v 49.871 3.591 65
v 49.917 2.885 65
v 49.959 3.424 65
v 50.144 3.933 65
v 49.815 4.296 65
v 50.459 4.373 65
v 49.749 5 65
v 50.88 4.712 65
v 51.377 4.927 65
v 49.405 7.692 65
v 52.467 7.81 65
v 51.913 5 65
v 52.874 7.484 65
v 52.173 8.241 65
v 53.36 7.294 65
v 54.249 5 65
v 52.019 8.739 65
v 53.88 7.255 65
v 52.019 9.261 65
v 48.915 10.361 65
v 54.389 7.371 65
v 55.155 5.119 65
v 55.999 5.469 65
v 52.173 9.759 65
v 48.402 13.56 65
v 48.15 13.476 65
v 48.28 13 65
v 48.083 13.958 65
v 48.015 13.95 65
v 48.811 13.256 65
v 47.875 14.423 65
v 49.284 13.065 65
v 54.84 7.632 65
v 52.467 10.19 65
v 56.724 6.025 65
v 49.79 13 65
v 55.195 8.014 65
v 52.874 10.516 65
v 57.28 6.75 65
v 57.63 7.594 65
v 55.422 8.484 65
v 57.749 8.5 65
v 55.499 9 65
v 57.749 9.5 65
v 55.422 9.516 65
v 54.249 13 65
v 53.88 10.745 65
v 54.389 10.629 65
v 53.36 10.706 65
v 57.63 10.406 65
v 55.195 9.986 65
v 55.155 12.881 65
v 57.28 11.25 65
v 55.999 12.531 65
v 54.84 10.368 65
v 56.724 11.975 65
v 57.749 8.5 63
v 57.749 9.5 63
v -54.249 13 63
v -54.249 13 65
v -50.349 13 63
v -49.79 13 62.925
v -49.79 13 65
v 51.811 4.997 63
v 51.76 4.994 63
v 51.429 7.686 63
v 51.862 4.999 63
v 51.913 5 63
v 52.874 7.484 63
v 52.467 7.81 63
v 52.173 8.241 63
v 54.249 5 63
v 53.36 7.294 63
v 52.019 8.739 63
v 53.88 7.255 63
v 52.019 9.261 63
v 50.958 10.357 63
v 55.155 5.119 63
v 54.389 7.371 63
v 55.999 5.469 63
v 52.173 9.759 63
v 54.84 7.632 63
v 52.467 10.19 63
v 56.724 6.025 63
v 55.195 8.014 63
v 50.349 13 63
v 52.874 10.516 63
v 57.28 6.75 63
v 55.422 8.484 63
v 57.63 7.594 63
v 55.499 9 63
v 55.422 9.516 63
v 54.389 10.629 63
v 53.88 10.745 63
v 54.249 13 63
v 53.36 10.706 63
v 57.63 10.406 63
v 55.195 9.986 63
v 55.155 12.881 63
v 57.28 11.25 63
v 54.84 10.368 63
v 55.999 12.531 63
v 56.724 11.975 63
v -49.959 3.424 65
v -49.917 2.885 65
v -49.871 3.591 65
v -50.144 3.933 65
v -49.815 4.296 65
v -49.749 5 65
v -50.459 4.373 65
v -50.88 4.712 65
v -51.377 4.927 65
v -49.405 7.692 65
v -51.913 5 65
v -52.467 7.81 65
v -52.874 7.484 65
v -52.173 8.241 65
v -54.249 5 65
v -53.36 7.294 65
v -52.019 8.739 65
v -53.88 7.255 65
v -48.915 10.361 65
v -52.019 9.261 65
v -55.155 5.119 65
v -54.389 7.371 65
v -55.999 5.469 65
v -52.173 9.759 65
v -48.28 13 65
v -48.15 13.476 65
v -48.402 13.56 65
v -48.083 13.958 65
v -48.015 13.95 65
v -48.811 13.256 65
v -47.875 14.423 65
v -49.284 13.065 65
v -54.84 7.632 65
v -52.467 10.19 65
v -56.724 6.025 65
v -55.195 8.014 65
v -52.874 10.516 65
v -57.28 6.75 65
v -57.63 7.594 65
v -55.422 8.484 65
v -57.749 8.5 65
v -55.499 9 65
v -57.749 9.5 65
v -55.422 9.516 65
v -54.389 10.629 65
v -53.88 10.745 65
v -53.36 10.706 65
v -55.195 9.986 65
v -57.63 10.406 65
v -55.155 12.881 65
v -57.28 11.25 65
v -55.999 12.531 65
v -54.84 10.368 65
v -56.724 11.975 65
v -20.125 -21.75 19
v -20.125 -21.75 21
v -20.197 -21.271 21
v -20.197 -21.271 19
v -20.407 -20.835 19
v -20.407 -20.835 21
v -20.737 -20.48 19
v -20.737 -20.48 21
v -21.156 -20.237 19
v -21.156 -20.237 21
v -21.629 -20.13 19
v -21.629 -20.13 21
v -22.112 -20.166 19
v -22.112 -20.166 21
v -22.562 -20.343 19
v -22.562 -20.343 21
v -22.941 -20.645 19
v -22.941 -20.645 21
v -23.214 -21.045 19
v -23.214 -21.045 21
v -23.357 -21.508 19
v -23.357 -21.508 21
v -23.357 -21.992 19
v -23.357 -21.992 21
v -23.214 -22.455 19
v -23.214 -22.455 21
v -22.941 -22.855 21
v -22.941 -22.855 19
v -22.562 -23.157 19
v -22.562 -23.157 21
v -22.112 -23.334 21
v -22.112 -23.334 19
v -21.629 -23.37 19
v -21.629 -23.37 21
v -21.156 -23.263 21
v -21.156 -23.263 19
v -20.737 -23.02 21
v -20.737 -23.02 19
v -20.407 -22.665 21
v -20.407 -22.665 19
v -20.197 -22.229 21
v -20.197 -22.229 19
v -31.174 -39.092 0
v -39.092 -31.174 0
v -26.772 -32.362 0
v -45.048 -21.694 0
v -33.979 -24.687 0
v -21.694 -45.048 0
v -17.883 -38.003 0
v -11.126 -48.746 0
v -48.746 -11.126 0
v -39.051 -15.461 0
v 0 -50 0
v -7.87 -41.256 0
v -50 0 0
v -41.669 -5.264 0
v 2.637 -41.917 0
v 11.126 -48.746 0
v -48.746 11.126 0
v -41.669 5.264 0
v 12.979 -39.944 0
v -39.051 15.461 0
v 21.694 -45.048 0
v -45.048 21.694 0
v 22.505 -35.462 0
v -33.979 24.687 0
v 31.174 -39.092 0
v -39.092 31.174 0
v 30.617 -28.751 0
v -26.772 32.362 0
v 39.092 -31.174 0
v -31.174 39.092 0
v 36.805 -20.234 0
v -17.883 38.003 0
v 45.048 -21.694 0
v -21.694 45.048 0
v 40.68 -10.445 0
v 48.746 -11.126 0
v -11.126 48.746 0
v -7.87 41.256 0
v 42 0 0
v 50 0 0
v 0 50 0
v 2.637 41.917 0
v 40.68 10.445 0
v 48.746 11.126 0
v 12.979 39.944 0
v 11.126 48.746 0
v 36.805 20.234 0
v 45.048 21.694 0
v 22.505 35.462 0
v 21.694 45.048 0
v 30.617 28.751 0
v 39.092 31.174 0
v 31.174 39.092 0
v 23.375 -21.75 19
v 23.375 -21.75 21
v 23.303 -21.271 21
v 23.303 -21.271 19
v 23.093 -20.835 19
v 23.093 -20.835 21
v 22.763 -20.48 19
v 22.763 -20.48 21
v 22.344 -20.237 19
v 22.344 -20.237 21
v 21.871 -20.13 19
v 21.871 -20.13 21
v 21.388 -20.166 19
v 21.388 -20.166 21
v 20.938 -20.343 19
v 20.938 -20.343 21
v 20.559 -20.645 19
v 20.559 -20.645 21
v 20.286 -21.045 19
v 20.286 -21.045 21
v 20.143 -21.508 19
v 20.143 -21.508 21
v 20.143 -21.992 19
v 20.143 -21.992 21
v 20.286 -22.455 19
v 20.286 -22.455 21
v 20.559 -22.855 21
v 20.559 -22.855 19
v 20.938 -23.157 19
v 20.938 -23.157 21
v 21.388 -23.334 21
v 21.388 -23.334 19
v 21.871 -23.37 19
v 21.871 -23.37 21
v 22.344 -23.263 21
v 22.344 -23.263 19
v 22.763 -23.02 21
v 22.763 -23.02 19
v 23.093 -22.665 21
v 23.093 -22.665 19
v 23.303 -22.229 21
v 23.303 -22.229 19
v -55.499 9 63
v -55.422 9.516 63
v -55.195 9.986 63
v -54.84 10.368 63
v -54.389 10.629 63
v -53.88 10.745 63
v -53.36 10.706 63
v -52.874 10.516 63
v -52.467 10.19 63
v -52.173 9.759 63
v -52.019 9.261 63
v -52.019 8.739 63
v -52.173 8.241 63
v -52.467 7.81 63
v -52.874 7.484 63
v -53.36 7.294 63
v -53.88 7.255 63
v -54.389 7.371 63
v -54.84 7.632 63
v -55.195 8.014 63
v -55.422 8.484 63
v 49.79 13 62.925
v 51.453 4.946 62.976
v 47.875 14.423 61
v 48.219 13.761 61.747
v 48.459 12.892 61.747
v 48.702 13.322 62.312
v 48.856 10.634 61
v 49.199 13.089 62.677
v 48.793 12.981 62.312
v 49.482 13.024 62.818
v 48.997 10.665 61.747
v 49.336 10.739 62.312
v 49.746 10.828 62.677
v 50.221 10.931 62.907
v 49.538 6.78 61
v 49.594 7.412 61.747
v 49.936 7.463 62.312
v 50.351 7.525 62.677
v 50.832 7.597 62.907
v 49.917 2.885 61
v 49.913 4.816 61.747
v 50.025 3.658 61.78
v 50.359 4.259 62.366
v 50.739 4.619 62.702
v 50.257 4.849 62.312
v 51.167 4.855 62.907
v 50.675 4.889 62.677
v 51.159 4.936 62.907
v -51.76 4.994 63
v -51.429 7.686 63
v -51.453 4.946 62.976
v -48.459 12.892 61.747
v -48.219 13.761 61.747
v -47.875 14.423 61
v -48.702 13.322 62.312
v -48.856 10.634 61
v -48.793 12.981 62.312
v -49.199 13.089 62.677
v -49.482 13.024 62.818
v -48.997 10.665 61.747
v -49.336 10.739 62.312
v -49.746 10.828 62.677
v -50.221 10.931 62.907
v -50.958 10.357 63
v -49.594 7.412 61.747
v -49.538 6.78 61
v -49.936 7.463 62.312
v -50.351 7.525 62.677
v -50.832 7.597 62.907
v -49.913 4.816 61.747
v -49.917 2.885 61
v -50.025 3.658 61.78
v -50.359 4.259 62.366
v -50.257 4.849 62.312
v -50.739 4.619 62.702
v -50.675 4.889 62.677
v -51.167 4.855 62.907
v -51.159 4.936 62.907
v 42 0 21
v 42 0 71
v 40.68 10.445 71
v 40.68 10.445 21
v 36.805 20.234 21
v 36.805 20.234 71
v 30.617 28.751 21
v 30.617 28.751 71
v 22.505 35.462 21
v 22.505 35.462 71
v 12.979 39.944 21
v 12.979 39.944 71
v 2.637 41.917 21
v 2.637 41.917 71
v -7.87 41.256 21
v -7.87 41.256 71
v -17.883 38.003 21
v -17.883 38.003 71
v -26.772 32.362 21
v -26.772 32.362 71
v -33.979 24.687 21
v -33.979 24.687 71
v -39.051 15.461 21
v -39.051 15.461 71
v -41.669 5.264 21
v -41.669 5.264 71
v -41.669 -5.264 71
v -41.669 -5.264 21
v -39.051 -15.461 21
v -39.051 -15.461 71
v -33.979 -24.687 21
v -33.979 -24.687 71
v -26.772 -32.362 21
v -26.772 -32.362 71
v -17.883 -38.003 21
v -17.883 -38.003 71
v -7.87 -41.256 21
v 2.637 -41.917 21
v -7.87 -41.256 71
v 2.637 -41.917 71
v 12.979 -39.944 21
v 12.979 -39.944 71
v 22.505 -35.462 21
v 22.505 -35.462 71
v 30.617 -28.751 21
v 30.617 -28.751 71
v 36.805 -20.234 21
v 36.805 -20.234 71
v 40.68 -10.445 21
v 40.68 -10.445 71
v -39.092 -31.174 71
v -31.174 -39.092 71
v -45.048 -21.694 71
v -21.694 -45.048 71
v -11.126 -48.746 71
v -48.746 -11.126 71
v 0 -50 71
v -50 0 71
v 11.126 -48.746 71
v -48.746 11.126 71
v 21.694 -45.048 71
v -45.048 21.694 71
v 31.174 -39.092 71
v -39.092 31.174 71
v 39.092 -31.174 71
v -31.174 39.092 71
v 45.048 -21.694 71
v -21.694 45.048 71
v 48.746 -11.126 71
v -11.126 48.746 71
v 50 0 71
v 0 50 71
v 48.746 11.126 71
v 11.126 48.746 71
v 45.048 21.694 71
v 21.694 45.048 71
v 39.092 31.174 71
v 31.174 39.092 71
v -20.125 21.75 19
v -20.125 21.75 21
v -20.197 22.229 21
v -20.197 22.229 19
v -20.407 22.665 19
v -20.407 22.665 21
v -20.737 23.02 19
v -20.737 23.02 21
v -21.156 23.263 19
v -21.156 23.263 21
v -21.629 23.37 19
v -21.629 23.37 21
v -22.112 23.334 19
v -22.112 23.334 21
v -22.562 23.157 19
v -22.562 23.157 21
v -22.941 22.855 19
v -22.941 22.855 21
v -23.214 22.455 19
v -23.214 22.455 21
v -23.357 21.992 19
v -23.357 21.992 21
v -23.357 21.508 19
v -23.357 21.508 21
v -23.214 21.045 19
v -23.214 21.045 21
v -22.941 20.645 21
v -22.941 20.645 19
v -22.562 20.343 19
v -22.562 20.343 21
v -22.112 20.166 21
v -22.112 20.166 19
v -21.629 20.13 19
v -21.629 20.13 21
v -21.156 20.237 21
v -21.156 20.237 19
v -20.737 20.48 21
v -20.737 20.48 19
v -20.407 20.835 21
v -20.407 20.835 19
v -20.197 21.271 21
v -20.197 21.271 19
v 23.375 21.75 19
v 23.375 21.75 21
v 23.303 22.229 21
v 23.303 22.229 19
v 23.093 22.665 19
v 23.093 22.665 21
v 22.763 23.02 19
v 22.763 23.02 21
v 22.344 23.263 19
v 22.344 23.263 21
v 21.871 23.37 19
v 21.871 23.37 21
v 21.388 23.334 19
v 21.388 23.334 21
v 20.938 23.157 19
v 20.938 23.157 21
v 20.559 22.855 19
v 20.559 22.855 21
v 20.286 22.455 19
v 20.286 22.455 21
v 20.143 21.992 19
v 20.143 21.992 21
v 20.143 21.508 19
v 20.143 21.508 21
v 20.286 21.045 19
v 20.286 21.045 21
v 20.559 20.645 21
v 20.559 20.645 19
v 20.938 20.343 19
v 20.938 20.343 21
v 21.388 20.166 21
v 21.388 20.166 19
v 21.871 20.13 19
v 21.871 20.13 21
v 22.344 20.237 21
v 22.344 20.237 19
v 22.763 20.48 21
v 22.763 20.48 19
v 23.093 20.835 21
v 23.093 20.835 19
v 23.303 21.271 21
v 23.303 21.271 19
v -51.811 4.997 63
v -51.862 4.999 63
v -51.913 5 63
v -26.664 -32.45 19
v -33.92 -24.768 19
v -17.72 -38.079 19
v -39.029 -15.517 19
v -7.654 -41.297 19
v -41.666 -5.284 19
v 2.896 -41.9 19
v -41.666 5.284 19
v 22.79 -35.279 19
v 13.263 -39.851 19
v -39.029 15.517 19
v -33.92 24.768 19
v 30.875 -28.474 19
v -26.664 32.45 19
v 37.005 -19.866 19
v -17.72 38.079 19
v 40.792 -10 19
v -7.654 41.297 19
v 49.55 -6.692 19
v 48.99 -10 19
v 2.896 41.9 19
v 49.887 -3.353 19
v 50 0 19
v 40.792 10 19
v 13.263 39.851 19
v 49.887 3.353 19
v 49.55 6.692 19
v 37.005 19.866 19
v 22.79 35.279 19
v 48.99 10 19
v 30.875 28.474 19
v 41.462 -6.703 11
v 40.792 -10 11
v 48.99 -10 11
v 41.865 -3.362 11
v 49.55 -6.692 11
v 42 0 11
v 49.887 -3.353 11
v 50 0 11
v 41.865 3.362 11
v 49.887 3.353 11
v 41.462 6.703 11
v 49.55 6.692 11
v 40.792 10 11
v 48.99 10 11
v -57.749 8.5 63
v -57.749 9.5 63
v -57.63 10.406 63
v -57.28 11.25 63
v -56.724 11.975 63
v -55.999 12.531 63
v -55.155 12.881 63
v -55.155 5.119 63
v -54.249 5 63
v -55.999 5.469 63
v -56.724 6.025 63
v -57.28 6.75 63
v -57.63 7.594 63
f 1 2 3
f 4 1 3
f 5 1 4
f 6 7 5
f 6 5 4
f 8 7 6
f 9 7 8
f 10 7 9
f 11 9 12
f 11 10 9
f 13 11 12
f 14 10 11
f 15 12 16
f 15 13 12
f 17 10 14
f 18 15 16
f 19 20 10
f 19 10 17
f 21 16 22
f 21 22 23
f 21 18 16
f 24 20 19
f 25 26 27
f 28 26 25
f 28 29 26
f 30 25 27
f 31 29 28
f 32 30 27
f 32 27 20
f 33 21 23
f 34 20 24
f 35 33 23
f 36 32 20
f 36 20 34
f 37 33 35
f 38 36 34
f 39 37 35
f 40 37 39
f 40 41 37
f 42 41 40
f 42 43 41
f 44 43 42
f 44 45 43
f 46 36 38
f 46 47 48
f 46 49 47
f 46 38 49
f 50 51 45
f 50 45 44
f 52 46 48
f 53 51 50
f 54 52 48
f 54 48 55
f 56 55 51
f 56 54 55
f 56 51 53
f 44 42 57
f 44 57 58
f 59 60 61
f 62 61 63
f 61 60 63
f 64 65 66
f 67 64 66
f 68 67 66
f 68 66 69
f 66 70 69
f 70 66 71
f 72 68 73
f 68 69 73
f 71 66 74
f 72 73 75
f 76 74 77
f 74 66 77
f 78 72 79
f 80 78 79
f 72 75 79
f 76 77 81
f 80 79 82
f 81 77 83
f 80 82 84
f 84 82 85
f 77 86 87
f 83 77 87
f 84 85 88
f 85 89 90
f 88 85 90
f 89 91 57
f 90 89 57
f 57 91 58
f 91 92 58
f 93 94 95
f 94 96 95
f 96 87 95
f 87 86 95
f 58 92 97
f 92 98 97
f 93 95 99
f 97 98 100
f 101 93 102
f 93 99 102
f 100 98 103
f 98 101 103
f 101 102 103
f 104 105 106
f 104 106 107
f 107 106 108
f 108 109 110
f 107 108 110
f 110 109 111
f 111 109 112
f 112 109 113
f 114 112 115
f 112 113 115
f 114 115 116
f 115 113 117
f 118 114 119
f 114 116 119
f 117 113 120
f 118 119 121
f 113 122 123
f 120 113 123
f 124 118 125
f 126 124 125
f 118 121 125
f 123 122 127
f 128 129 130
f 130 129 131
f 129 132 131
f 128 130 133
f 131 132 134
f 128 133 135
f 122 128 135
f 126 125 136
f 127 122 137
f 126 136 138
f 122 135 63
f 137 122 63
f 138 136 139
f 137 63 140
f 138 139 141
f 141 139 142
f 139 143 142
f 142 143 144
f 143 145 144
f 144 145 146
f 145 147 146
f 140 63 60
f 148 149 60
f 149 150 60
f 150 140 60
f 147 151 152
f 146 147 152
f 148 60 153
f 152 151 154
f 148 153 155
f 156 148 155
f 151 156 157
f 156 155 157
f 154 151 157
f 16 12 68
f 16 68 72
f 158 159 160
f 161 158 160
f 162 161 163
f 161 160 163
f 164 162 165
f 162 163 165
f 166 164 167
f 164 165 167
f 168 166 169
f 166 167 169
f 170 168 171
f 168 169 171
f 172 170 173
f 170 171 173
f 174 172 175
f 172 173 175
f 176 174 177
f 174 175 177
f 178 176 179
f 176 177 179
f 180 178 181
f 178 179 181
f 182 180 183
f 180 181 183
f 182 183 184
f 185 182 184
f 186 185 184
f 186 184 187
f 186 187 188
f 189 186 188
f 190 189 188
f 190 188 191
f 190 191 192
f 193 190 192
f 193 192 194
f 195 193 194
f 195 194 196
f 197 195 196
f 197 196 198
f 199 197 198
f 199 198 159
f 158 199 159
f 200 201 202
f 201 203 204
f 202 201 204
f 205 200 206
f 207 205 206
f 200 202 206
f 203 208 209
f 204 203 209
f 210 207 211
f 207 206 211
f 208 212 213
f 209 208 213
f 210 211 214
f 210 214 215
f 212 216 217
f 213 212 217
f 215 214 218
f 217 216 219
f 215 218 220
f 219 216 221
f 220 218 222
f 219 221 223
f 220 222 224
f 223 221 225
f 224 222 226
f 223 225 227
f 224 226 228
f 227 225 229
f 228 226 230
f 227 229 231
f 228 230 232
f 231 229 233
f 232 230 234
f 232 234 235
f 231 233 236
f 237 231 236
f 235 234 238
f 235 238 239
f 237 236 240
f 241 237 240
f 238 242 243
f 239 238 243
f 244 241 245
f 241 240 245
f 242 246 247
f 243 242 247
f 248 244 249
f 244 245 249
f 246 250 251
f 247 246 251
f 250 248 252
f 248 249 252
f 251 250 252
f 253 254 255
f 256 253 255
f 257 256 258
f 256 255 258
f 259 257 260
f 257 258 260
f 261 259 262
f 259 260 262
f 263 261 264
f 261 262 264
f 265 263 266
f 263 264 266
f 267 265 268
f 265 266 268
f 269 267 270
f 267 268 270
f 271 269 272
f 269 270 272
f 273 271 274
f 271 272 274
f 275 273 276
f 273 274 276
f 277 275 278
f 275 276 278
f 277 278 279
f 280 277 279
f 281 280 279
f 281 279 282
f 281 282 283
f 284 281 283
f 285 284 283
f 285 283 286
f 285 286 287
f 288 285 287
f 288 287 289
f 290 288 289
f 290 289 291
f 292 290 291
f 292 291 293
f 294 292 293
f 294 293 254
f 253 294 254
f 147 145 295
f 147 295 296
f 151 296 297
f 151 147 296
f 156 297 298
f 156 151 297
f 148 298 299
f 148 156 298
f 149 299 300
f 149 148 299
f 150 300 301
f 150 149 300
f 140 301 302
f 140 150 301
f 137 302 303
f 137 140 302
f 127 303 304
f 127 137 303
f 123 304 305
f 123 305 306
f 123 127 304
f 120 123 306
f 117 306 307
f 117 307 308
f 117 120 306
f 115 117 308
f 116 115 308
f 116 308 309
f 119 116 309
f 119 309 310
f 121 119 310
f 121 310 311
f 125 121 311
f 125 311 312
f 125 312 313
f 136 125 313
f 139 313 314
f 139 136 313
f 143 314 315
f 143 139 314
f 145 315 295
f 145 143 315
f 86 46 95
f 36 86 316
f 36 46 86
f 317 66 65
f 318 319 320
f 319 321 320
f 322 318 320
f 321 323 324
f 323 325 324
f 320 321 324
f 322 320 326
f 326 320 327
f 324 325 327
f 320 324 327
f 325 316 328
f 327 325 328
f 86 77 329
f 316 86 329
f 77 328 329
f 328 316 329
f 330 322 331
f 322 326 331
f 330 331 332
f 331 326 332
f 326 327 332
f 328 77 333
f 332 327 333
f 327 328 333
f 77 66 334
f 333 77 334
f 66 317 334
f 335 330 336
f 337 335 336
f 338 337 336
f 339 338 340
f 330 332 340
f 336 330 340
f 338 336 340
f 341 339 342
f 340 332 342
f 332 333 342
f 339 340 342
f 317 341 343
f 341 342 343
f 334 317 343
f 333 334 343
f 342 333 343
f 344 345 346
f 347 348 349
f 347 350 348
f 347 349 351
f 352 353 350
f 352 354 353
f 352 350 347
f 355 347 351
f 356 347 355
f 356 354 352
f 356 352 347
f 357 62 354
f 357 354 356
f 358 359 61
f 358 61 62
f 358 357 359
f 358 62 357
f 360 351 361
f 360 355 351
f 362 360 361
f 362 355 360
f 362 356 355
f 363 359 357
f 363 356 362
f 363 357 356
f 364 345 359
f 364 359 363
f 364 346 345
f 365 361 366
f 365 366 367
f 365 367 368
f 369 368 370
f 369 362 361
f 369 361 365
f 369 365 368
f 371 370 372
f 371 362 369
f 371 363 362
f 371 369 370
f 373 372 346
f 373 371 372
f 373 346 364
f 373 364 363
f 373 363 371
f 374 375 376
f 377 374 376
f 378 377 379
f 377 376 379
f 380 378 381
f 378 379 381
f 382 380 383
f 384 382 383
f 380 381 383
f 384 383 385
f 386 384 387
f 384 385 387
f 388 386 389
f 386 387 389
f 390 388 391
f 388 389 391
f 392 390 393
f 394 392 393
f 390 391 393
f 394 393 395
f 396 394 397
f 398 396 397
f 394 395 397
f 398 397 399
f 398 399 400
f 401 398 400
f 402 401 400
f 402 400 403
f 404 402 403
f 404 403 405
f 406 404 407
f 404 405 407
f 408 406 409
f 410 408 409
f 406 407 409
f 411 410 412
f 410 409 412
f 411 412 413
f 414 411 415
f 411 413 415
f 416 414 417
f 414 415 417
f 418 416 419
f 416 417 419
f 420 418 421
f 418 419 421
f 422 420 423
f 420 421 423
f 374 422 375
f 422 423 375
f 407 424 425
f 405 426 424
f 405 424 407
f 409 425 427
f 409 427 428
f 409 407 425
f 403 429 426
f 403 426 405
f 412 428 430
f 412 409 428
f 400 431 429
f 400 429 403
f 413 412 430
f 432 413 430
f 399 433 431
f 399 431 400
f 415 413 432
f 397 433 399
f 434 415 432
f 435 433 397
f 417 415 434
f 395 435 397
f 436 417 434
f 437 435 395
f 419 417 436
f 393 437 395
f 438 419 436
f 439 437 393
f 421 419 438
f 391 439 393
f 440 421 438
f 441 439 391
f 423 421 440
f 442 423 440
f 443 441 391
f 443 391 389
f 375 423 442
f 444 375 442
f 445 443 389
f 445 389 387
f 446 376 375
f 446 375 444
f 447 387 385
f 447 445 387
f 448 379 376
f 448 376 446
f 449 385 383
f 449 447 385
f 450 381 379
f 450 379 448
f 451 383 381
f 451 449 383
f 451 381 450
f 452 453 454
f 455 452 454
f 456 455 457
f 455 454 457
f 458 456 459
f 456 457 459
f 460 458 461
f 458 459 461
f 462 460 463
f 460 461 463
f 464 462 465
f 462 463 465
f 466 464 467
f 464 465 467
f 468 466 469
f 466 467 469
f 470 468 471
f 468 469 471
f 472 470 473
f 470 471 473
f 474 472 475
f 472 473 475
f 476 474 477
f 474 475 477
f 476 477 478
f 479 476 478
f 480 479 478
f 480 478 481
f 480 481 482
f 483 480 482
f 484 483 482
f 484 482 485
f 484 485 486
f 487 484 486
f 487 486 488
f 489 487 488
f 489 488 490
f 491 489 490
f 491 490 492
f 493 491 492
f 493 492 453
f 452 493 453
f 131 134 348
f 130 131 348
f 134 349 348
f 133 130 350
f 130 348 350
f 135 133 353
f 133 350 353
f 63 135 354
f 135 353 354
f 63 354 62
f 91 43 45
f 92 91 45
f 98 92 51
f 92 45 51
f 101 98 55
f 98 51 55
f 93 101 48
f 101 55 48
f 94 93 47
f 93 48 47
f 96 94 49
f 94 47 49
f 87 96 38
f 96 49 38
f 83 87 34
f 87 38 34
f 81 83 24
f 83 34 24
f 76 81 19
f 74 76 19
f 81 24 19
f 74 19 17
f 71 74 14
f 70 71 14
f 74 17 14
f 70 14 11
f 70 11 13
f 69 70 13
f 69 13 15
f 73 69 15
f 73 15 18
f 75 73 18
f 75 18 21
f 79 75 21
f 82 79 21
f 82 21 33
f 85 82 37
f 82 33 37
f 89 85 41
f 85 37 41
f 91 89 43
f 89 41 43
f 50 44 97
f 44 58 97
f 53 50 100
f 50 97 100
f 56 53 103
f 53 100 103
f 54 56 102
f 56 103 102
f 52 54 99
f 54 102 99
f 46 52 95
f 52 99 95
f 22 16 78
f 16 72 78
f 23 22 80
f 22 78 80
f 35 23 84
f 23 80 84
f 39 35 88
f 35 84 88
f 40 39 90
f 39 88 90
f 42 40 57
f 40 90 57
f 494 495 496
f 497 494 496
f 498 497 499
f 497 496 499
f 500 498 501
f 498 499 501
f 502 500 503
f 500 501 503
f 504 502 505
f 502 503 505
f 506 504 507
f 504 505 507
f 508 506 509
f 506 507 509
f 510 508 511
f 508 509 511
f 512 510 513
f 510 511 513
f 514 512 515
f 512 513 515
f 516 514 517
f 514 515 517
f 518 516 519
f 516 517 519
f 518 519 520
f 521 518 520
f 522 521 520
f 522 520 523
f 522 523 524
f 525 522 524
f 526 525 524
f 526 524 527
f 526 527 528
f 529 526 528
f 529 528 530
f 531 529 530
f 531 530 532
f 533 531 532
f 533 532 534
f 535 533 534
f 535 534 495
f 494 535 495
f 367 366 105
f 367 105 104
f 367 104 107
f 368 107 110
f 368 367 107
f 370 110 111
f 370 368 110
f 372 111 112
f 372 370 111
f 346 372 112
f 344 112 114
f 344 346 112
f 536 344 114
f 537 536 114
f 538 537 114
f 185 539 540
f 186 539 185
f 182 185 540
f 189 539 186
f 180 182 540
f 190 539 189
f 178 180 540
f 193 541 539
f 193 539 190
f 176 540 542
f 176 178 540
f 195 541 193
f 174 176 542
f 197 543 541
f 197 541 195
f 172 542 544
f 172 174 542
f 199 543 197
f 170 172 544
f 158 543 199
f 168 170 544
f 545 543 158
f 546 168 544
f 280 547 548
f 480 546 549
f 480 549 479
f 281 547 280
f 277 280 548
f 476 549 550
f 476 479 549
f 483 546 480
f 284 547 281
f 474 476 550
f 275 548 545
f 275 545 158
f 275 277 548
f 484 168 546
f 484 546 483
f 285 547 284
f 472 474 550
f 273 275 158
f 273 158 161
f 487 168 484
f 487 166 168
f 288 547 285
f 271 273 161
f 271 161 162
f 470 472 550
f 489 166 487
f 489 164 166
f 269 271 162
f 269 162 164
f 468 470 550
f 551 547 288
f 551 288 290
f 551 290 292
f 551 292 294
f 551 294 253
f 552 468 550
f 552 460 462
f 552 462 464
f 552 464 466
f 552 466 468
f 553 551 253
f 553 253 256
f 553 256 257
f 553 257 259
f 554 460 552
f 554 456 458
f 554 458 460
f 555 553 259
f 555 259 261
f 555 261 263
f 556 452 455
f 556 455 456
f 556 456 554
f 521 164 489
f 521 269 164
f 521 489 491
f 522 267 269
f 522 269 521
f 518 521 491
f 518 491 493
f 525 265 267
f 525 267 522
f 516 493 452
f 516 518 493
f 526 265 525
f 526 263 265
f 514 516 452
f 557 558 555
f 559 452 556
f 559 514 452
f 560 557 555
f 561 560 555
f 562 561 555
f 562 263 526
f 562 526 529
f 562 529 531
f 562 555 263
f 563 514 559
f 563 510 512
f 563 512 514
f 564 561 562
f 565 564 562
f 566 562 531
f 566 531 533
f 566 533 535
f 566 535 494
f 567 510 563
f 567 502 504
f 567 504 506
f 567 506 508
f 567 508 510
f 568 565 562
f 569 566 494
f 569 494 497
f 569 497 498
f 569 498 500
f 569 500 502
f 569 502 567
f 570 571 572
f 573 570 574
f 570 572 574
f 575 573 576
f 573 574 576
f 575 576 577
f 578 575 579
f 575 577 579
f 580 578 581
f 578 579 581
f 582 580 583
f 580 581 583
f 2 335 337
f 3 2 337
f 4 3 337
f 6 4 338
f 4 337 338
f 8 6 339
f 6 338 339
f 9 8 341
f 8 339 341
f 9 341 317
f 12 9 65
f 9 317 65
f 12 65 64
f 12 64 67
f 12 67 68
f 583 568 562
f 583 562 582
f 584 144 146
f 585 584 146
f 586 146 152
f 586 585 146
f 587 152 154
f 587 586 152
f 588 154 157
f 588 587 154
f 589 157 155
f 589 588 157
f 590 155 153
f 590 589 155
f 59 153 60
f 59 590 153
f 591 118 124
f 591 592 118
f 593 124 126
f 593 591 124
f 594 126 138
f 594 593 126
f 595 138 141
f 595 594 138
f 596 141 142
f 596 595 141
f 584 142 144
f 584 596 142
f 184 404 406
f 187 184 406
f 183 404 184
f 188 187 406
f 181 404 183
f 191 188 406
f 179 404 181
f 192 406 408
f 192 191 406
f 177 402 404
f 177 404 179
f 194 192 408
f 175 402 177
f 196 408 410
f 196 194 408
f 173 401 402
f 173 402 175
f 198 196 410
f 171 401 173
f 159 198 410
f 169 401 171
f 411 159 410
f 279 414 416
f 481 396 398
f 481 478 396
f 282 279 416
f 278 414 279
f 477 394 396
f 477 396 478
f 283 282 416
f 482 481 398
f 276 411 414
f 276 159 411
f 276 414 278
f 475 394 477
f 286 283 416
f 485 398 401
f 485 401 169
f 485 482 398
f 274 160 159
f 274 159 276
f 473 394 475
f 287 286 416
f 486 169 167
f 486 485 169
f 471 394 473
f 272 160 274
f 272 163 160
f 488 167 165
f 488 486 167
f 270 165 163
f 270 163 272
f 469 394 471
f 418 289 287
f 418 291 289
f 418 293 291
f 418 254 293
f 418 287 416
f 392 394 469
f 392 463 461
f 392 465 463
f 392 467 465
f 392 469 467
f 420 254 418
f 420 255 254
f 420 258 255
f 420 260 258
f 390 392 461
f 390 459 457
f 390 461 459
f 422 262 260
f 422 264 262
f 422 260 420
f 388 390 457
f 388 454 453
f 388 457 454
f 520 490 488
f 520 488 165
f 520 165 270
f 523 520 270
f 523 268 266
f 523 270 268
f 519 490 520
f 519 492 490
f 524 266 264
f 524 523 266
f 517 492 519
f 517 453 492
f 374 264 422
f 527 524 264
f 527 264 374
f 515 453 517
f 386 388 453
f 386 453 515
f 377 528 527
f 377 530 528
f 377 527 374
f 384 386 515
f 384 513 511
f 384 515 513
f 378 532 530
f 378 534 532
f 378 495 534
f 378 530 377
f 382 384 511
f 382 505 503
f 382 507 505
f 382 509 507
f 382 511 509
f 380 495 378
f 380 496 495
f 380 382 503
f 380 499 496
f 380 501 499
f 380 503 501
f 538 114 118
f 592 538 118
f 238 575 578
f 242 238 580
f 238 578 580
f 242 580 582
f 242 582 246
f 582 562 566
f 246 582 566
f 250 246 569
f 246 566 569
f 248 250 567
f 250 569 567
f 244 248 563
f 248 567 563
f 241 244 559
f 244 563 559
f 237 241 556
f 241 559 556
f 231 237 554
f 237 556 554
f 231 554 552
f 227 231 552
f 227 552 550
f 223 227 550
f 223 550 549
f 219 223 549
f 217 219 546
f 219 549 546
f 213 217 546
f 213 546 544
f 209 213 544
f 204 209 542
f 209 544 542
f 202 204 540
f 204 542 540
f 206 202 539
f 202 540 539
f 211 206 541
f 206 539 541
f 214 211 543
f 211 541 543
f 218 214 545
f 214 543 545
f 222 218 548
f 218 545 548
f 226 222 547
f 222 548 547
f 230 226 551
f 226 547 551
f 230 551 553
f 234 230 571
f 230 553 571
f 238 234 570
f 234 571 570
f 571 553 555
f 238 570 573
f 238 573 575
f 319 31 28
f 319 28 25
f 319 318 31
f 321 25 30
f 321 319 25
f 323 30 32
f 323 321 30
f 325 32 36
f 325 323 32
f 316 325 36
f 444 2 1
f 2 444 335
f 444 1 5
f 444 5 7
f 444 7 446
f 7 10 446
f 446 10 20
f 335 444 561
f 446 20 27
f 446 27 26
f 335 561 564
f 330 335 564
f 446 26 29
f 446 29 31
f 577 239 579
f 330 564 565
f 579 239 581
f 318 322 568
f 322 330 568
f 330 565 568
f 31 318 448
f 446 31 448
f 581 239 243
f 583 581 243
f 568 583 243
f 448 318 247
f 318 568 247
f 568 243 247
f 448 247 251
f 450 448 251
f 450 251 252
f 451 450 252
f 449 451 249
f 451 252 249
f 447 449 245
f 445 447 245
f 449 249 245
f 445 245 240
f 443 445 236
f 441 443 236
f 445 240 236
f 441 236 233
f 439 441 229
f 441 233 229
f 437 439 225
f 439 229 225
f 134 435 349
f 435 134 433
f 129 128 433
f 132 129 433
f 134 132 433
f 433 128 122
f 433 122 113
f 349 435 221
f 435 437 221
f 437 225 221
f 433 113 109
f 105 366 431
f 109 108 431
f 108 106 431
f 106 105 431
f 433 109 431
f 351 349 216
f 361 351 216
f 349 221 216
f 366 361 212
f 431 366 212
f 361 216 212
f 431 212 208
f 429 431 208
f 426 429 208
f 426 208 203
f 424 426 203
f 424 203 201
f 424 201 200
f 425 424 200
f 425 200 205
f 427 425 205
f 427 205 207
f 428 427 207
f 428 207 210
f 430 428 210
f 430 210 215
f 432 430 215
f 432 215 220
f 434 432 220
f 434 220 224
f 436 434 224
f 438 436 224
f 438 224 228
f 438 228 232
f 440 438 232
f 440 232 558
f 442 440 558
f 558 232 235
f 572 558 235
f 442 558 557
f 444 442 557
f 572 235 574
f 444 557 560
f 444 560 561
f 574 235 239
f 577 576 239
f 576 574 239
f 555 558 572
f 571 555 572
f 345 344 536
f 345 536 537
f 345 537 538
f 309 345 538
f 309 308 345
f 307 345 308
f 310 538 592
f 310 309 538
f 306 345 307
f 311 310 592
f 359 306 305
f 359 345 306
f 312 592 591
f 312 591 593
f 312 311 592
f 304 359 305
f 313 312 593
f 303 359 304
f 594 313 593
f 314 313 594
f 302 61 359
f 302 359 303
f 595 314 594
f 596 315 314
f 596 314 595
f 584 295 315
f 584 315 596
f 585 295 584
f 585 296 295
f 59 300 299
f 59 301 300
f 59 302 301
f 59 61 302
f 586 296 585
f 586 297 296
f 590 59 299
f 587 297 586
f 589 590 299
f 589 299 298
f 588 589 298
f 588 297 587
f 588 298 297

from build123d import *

# Parameters (mm, degrees)
ESQUISSE1_R                  = 50
BOSS_EXTRU_1_DEPTH           = 71
COQUE1_T                     = -8
ESQUISSE2_R                  = 42
ESQUISSE2_R_2                = 1.625
ENL_V_MAT_EXTRU_4_DEPTH      = 71
ESQUISSE2_5_R                = 42
ESQUISSE2_5_R_2              = 1.625
BOSS_EXTRU_4_DEPTH           = 52
ESQUISSE2_6_R                = 42
ESQUISSE2_6_R_2              = 1.625
ENL_V_MAT_EXTRU_5_DEPTH      = 50
ENL_V_MAT_EXTRU_6_REACH      = 102.205
ESQUISSE2_7_R                = 1.625
ENL_V_MAT_EXTRU_7_REACH      = 134.442
ENL_V_MAT_EXTRU_7_END_RADIUS = 42
ESQUISSE9_W                  = 8
ESQUISSE9_H                  = 20
ESQUISSE14_R                 = 1.75
BOSS_EXTRU_6_DEPTH           = 2
CONG_1_R                     = 2
CONG_2_R                     = 3.5


with BuildPart() as part:
    # Esquisse1 → Boss.-Extru.1 (new body)
    with BuildSketch(Plane.XY):
        Circle(ESQUISSE1_R)
    extrude(amount=BOSS_EXTRU_1_DEPTH)

    # Coque1
    coque1_openings = [part.faces().sort_by_distance(p)[0] for p in [
        (0, 0, 71),
    ]]
    offset(amount=COQUE1_T, openings=coque1_openings, kind=Kind.INTERSECTION)

    # Esquisse2 → Enl_v. mat.-Extru.4 (cut)
    with BuildSketch(Plane.XY.offset(71)):
        Circle(ESQUISSE2_R)
        with Locations((-21.75, -21.75)):
            Circle(ESQUISSE2_R_2, mode=Mode.SUBTRACT)
        with Locations((21.75, -21.75)):
            Circle(ESQUISSE2_R_2, mode=Mode.SUBTRACT)
        with Locations((21.75, 21.75)):
            Circle(ESQUISSE2_R_2, mode=Mode.SUBTRACT)
        with Locations((-21.75, 21.75)):
            Circle(ESQUISSE2_R_2, mode=Mode.SUBTRACT)
        with Locations((-21.75, 21.75)):
            Circle(ESQUISSE2_R_2)
        with Locations((-21.75, -21.75)):
            Circle(ESQUISSE2_R_2)
        with Locations((21.75, -21.75)):
            Circle(ESQUISSE2_R_2)
        with Locations((21.75, 21.75)):
            Circle(ESQUISSE2_R_2)
    extrude(amount=-ENL_V_MAT_EXTRU_4_DEPTH, mode=Mode.SUBTRACT)

    # Esquisse2_5 → Boss.-Extru.4 (add)
    with BuildSketch(Plane.XY.offset(71)):
        Circle(ESQUISSE2_5_R)
        with Locations((-21.75, -21.75)):
            Circle(ESQUISSE2_5_R_2, mode=Mode.SUBTRACT)
        with Locations((21.75, -21.75)):
            Circle(ESQUISSE2_5_R_2, mode=Mode.SUBTRACT)
        with Locations((21.75, 21.75)):
            Circle(ESQUISSE2_5_R_2, mode=Mode.SUBTRACT)
        with Locations((-21.75, 21.75)):
            Circle(ESQUISSE2_5_R_2, mode=Mode.SUBTRACT)
        with Locations((-21.75, 21.75)):
            Circle(ESQUISSE2_5_R_2)
        with Locations((21.75, 21.75)):
            Circle(ESQUISSE2_5_R_2)
        with Locations((21.75, -21.75)):
            Circle(ESQUISSE2_5_R_2)
        with Locations((-21.75, -21.75)):
            Circle(ESQUISSE2_5_R_2)
    extrude(amount=-BOSS_EXTRU_4_DEPTH)

    # Esquisse2_6 → Enl_v. mat.-Extru.5 (cut)
    with BuildSketch(Plane.XY.offset(71)):
        Circle(ESQUISSE2_6_R)
        with Locations((-21.75, 21.75)):
            Circle(ESQUISSE2_6_R_2, mode=Mode.SUBTRACT)
        with Locations((21.75, 21.75)):
            Circle(ESQUISSE2_6_R_2, mode=Mode.SUBTRACT)
        with Locations((21.75, -21.75)):
            Circle(ESQUISSE2_6_R_2, mode=Mode.SUBTRACT)
        with Locations((-21.75, -21.75)):
            Circle(ESQUISSE2_6_R_2, mode=Mode.SUBTRACT)
    extrude(amount=-ENL_V_MAT_EXTRU_5_DEPTH, mode=Mode.SUBTRACT)

    # Esquisse2_7 → Enl_v. mat.-Extru.6 (cut, up to next)
    with BuildSketch(Plane.XY.offset(71), mode=Mode.PRIVATE) as enl_v_mat_extru_6_sk1:
        with Locations((-21.75, 21.75)):
            Circle(ESQUISSE2_7_R)
    enl_v_mat_extru_6_tool1 = extrude(enl_v_mat_extru_6_sk1.sketch, amount=-ENL_V_MAT_EXTRU_6_REACH, mode=Mode.PRIVATE) & part.part
    # Esquisse2_7 → Enl_v. mat.-Extru.6 (cut, up to next)
    with BuildSketch(Plane.XY.offset(71), mode=Mode.PRIVATE) as enl_v_mat_extru_6_sk2:
        with Locations((21.75, 21.75)):
            Circle(ESQUISSE2_7_R)
    enl_v_mat_extru_6_tool2 = extrude(enl_v_mat_extru_6_sk2.sketch, amount=-ENL_V_MAT_EXTRU_6_REACH, mode=Mode.PRIVATE) & part.part
    # Esquisse2_7 → Enl_v. mat.-Extru.6 (cut, up to next)
    with BuildSketch(Plane.XY.offset(71), mode=Mode.PRIVATE) as enl_v_mat_extru_6_sk3:
        with Locations((21.75, -21.75)):
            Circle(ESQUISSE2_7_R)
    enl_v_mat_extru_6_tool3 = extrude(enl_v_mat_extru_6_sk3.sketch, amount=-ENL_V_MAT_EXTRU_6_REACH, mode=Mode.PRIVATE) & part.part
    # Esquisse2_7 → Enl_v. mat.-Extru.6 (cut, up to next)
    with BuildSketch(Plane.XY.offset(71), mode=Mode.PRIVATE) as enl_v_mat_extru_6_sk4:
        with Locations((-21.75, -21.75)):
            Circle(ESQUISSE2_7_R)
    enl_v_mat_extru_6_tool4 = extrude(enl_v_mat_extru_6_sk4.sketch, amount=-ENL_V_MAT_EXTRU_6_REACH, mode=Mode.PRIVATE) & part.part
    add(enl_v_mat_extru_6_tool1.solids().sort_by_distance((-21.75, 21.75, 71))[0], mode=Mode.SUBTRACT)
    add(enl_v_mat_extru_6_tool2.solids().sort_by_distance((21.75, 21.75, 71))[0], mode=Mode.SUBTRACT)
    add(enl_v_mat_extru_6_tool3.solids().sort_by_distance((21.75, -21.75, 71))[0], mode=Mode.SUBTRACT)
    add(enl_v_mat_extru_6_tool4.solids().sort_by_distance((-21.75, -21.75, 71))[0], mode=Mode.SUBTRACT)

    # Enl_v. mat.-Extru.7: up to this cylinder (the profile starts outside it)
    enl_v_mat_extru_7_end = Plane(origin=(0, 0, 15), z_dir=(0, 0, -1)) * Cylinder(ENL_V_MAT_EXTRU_7_END_RADIUS, 353.884, mode=Mode.PRIVATE)
    # Esquisse9 → Enl_v. mat.-Extru.7 (cut, up to the surface)
    with BuildSketch(Plane(origin=(50, 0, 0), x_dir=(0, 0, -1), z_dir=(1, 0, 0)), mode=Mode.PRIVATE) as enl_v_mat_extru_7_sk1:
        with Locations((-15, 0)):
            Rectangle(ESQUISSE9_W, ESQUISSE9_H)
    enl_v_mat_extru_7_tool1 = extrude(enl_v_mat_extru_7_sk1.sketch, amount=-ENL_V_MAT_EXTRU_7_REACH, mode=Mode.PRIVATE) - enl_v_mat_extru_7_end
    add(enl_v_mat_extru_7_tool1.solids().sort_by_distance((50, 0, 15))[0], mode=Mode.SUBTRACT)

    # Esquisse14 → Boss.-Extru.6 (add)
    with BuildSketch(Plane.XY.offset(65)):
        with BuildLine():
            Line((49.749371855, 5), (57.749371855, 5))
            Line((57.749371855, 5), (57.749371855, 13))
            Line((57.749371855, 13), (48.280430818, 13))
            ThreePointArc((48.280430818, 13), (49.177846161, 9.029919542), (49.749371855, 5))
        make_face()
        with Locations((53.749371855, 9)):
            Circle(ESQUISSE14_R, mode=Mode.SUBTRACT)
    boss_extru_6 = extrude(amount=-BOSS_EXTRU_6_DEPTH)

    # Sym_trie1: Boss.-Extru.6 across plane
    add(boss_extru_6.mirror(Plane(origin=(0, 0, 0), x_dir=(0, 0, 1), z_dir=(1, 0, 0))))

    # Cong_1
    cong_1_edges = [part.edges().sort_by_distance(p)[0] for p in [
        (49.749371855, 5, 64),
        (48.280430818, 13, 64),
        (49.177846161, 9.029919542, 63),
        (-49.177846161, 9.029919542, 63),
        (-48.280430818, 13, 64),
        (-49.749371855, 5, 64),
    ]]
    fillet(cong_1_edges, radius=CONG_1_R)

    # Cong_2
    cong_2_edges = [part.edges().sort_by_distance(p)[0] for p in [
        (57.749371855, 13, 64),
        (57.749371855, 5, 64),
        (-57.749371855, 5, 64),
        (-57.749371855, 13, 64),
    ]]
    fillet(cong_2_edges, radius=CONG_2_R)


solid = part.part
